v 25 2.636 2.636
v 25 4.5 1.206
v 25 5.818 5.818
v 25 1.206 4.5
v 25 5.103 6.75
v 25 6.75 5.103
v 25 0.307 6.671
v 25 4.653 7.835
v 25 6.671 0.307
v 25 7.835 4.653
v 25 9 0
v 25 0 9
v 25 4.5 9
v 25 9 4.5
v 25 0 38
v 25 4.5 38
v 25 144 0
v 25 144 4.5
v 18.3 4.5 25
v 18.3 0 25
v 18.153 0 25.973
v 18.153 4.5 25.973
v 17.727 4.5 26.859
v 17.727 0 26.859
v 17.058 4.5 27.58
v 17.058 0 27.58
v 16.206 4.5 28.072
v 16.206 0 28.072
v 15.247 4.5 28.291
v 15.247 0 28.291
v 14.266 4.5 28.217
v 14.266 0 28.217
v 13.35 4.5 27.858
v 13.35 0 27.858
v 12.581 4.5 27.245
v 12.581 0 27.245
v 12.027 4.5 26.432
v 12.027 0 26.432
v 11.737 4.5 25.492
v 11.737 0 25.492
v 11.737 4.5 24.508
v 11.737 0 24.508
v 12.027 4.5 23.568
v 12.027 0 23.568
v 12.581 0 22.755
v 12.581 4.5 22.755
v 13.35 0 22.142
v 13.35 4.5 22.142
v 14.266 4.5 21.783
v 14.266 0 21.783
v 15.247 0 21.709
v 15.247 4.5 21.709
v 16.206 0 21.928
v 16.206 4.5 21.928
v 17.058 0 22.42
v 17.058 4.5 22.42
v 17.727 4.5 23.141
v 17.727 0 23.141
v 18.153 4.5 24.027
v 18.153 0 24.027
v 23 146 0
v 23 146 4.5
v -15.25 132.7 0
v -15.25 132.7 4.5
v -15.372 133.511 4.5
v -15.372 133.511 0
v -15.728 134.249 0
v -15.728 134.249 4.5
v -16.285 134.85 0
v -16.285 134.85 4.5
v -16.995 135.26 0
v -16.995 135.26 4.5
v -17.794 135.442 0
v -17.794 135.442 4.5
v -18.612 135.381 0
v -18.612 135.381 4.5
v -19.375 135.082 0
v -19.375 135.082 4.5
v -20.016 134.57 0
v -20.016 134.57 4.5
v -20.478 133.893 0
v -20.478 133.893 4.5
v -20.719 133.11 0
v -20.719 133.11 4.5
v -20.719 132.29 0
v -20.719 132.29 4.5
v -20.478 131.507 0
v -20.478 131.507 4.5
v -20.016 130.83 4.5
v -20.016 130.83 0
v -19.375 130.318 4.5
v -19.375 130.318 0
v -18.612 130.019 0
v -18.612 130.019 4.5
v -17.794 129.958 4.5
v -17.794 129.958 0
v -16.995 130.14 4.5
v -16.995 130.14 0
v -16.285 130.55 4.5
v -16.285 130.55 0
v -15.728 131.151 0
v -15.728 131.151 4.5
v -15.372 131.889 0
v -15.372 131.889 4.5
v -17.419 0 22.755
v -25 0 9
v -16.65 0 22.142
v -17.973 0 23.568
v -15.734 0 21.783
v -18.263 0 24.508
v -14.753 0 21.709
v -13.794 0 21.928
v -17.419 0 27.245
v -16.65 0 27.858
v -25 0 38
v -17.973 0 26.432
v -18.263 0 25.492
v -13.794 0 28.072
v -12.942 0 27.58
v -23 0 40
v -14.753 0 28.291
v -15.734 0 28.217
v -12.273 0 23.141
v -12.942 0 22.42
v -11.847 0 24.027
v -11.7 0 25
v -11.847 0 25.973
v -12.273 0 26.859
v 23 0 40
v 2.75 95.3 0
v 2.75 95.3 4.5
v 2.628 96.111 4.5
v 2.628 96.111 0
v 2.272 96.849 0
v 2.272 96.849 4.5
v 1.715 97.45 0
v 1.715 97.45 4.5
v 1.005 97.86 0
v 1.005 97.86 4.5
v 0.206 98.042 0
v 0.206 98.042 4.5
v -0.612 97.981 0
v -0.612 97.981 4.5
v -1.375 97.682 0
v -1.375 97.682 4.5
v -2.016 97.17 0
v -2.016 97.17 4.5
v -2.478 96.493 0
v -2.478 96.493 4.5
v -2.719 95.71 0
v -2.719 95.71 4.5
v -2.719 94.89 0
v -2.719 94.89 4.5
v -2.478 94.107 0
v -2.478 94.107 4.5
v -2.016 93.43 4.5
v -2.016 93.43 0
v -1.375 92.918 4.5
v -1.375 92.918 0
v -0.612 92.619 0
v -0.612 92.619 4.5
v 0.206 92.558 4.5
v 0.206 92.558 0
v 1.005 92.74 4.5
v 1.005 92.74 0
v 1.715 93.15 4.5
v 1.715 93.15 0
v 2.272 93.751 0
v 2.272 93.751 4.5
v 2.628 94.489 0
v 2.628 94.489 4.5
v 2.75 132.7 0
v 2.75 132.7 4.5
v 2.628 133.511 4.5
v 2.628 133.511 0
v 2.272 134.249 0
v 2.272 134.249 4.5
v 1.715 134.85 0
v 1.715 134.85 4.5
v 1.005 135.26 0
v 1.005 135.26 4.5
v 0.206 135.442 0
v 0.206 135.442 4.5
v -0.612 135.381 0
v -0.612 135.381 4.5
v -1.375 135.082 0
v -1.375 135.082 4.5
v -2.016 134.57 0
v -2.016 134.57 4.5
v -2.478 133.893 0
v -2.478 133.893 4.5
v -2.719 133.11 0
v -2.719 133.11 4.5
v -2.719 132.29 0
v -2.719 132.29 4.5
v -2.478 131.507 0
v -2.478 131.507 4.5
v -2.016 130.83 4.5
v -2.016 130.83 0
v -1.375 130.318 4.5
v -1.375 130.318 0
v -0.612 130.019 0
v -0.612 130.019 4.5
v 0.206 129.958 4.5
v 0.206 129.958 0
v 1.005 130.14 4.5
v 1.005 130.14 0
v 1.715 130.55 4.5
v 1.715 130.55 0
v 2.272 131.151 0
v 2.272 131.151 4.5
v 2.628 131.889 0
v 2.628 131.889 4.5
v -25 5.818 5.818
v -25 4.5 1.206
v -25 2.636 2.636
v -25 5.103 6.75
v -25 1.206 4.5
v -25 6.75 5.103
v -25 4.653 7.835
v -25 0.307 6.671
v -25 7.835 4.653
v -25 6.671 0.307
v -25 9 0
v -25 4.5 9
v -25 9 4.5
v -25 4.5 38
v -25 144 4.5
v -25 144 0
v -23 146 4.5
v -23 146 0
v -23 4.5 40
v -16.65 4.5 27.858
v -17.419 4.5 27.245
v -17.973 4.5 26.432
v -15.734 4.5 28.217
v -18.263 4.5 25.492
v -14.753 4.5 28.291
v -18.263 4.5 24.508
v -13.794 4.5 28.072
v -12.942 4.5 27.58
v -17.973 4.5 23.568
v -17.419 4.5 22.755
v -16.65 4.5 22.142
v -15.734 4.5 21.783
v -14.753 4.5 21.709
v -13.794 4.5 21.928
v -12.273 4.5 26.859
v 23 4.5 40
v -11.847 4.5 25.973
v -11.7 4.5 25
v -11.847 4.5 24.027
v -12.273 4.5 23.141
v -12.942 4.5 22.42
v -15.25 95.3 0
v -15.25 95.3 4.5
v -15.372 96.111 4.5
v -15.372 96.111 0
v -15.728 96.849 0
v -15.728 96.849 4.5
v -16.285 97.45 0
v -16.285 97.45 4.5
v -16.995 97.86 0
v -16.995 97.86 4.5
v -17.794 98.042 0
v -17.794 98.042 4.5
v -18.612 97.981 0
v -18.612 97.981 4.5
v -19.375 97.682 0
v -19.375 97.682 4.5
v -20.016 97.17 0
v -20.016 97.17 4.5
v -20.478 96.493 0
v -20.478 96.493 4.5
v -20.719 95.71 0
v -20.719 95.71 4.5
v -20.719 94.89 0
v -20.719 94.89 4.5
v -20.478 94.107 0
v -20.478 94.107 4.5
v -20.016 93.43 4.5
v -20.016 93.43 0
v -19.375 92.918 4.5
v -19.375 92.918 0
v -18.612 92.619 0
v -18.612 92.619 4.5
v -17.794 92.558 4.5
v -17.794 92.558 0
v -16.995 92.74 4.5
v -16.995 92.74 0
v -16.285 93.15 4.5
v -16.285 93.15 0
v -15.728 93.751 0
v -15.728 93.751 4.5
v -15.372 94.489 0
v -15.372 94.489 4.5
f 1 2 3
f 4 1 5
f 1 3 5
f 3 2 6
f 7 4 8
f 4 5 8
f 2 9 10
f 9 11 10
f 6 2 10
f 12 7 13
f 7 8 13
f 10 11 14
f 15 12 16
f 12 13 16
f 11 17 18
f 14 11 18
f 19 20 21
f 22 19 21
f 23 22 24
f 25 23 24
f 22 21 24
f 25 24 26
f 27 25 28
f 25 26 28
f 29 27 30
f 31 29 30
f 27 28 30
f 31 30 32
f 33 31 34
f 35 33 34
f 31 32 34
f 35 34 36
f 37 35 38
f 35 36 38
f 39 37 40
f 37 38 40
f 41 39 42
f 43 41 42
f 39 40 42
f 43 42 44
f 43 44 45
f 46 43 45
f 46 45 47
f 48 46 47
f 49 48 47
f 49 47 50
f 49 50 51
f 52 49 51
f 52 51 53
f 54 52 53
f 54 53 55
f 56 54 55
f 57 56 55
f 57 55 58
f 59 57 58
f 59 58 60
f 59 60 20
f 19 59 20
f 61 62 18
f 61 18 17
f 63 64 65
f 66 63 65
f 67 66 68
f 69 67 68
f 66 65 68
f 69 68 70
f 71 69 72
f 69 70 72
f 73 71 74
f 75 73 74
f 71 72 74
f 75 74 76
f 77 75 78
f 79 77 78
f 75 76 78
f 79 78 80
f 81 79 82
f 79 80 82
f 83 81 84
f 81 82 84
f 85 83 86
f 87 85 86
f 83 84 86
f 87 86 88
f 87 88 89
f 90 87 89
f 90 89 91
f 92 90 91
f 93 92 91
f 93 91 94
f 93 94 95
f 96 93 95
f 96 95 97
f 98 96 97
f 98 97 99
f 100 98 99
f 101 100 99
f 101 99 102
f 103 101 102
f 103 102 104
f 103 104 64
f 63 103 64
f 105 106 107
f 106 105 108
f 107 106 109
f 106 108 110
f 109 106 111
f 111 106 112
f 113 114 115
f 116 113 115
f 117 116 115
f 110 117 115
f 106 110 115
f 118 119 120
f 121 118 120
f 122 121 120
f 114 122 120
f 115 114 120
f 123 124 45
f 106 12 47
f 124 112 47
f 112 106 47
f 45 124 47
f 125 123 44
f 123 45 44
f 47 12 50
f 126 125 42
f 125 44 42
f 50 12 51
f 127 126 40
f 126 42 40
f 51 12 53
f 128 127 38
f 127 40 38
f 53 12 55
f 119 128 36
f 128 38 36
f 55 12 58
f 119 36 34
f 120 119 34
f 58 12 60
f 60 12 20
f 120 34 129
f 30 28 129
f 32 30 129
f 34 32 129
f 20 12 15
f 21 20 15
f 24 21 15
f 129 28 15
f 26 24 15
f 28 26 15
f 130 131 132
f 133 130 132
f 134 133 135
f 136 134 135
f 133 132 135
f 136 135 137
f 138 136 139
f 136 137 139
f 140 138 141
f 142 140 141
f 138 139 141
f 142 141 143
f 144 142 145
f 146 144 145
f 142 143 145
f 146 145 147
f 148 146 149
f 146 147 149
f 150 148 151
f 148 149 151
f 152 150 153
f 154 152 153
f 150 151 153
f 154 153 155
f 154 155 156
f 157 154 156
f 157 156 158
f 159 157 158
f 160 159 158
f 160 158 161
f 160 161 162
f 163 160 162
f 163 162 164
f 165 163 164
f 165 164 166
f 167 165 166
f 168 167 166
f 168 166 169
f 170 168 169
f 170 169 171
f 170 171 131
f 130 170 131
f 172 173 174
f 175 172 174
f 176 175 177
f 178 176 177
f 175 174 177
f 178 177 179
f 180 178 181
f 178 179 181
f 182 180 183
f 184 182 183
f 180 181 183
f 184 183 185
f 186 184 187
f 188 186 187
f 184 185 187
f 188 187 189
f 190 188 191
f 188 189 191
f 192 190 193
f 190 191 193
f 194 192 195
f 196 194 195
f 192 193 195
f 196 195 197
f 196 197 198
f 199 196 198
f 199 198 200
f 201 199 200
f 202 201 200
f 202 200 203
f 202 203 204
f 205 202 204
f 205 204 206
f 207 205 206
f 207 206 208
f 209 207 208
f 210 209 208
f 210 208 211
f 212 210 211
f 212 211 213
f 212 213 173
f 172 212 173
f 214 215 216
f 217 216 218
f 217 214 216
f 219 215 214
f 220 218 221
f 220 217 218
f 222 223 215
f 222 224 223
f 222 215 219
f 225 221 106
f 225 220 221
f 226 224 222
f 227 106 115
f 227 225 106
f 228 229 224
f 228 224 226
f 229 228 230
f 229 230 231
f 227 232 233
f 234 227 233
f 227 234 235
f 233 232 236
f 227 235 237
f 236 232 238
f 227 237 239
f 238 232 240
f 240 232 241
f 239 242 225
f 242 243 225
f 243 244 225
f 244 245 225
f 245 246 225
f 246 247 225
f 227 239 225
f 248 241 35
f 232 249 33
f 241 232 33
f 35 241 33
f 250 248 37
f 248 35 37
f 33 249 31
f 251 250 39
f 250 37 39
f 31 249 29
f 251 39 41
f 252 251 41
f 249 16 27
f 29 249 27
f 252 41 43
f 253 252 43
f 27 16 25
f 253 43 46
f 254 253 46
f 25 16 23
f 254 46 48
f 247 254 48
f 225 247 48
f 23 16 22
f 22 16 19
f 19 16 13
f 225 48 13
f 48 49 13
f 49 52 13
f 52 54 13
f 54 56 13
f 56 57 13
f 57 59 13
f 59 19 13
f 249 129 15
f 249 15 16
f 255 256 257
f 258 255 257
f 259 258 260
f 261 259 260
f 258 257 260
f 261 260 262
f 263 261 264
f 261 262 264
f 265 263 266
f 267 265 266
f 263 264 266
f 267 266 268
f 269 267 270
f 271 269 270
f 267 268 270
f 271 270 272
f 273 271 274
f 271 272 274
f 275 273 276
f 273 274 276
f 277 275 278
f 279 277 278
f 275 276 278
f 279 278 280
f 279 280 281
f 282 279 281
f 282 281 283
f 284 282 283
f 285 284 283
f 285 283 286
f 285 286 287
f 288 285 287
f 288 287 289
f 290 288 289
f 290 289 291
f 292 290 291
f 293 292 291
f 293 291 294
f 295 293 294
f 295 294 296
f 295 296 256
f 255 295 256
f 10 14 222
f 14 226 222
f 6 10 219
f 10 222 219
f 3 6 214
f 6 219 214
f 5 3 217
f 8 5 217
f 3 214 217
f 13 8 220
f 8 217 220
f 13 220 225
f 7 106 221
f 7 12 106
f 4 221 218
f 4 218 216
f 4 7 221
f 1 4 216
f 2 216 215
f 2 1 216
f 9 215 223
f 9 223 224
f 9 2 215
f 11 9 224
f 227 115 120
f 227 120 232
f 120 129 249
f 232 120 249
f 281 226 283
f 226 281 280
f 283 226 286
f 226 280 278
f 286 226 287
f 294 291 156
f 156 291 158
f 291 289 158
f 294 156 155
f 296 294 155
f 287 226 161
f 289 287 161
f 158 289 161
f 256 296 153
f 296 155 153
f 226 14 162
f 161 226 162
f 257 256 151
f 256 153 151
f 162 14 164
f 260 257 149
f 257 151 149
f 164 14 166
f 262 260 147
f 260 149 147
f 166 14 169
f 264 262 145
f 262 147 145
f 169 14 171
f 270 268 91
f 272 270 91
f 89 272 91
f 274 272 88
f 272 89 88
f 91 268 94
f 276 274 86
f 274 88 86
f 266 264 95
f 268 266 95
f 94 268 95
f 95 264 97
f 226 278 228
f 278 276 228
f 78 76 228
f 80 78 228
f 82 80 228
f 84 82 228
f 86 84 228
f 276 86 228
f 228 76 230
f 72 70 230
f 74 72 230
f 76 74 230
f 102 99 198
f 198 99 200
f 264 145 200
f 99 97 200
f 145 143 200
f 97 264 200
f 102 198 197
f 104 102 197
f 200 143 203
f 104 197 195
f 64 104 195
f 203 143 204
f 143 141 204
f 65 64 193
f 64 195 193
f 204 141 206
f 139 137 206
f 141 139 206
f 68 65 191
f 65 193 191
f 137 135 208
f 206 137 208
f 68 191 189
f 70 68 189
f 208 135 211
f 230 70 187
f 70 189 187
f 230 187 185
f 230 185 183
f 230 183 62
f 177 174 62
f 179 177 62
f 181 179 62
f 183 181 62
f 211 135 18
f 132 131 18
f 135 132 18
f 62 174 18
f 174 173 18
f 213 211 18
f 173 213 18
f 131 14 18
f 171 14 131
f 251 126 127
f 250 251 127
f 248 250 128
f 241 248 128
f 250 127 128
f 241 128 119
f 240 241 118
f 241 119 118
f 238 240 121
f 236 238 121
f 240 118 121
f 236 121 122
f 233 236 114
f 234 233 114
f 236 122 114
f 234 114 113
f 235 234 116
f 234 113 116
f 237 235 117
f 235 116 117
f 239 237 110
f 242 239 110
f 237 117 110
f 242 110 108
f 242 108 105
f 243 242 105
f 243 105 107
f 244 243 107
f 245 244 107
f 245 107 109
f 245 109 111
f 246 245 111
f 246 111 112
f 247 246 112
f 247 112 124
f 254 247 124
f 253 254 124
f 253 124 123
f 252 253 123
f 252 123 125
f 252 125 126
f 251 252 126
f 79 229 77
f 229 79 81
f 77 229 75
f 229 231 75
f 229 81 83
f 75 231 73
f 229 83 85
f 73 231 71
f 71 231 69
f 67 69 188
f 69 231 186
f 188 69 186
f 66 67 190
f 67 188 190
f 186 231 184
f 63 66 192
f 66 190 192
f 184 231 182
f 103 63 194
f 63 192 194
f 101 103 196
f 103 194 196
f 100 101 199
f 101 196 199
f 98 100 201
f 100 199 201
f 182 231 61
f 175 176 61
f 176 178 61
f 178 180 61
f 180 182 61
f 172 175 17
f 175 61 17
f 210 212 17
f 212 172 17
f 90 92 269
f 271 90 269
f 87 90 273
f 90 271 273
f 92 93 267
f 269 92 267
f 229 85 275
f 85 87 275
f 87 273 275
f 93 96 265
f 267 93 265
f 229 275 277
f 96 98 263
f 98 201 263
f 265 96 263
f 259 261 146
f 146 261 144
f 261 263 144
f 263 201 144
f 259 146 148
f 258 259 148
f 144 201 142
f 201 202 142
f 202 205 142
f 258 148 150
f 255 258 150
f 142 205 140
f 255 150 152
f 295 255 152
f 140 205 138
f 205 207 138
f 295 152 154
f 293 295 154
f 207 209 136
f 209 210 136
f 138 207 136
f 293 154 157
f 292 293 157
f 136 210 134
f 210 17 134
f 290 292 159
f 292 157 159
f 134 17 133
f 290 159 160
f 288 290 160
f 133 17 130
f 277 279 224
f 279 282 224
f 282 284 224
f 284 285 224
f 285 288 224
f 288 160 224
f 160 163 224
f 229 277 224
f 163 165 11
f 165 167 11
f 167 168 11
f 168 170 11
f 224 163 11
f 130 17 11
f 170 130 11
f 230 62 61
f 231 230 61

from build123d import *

# Parameters (mm, degrees)
BOSS_EXTRUDE1_DEPTH  = 25
FILLET1_R            = 4.5
FILLET2_R            = 9
M6_CLEARANCE_HOLE1_D = 6.6
M5_CLEARANCE_HOLE1_D = 5.5
CHAMFER1_SIZE        = 2


with BuildPart() as part:
    # Sketch1 → Boss-Extrude1 (new body, symmetric)
    with BuildSketch(Plane(origin=(0, 0, 0), x_dir=(0, 0, -1), z_dir=(1, 0, 0))):
        Polygon((0, 0), (-40, 0), (-40, 4.5), (-4.5, 4.5), (-4.5, 146), (0, 146), align=None)
    extrude(amount=BOSS_EXTRUDE1_DEPTH, both=True)

    # Fillet1
    fillet1_edges = [part.edges().sort_by_distance(p)[0] for p in [
        (0, 4.5, 4.5),
    ]]
    fillet(fillet1_edges, radius=FILLET1_R)

    # Fillet2
    fillet2_edges = [part.edges().sort_by_distance(p)[0] for p in [
        (0, 0, 0),
    ]]
    fillet(fillet2_edges, radius=FILLET2_R)

    # M6 Clearance Hole1 (through all)
    with Locations(Plane(origin=(0, 4.5, 0), x_dir=(-1, 0, 0), z_dir=(0, 1, 0))):
        with Locations((15, 25), (-15, 25)):
            Hole(M6_CLEARANCE_HOLE1_D / 2)

    # M5 Clearance Hole1 (through all)
    with Locations(Plane(origin=(0, 0, 0), x_dir=(-1, 0, 0), z_dir=(0, 0, -1))):
        with Locations((18, 132.7), (0, 132.7), (0, 95.3), (18, 95.3)):
            Hole(M5_CLEARANCE_HOLE1_D / 2)

    # Chamfer1
    chamfer1_edges = [part.edges().sort_by_distance(p)[0] for p in [
        (25, 2.25, 40),
        (25, 146, 2.25),
        (-25, 146, 2.25),
        (-25, 2.25, 40),
    ]]
    chamfer(chamfer1_edges, length=CHAMFER1_SIZE)


solid = part.part
